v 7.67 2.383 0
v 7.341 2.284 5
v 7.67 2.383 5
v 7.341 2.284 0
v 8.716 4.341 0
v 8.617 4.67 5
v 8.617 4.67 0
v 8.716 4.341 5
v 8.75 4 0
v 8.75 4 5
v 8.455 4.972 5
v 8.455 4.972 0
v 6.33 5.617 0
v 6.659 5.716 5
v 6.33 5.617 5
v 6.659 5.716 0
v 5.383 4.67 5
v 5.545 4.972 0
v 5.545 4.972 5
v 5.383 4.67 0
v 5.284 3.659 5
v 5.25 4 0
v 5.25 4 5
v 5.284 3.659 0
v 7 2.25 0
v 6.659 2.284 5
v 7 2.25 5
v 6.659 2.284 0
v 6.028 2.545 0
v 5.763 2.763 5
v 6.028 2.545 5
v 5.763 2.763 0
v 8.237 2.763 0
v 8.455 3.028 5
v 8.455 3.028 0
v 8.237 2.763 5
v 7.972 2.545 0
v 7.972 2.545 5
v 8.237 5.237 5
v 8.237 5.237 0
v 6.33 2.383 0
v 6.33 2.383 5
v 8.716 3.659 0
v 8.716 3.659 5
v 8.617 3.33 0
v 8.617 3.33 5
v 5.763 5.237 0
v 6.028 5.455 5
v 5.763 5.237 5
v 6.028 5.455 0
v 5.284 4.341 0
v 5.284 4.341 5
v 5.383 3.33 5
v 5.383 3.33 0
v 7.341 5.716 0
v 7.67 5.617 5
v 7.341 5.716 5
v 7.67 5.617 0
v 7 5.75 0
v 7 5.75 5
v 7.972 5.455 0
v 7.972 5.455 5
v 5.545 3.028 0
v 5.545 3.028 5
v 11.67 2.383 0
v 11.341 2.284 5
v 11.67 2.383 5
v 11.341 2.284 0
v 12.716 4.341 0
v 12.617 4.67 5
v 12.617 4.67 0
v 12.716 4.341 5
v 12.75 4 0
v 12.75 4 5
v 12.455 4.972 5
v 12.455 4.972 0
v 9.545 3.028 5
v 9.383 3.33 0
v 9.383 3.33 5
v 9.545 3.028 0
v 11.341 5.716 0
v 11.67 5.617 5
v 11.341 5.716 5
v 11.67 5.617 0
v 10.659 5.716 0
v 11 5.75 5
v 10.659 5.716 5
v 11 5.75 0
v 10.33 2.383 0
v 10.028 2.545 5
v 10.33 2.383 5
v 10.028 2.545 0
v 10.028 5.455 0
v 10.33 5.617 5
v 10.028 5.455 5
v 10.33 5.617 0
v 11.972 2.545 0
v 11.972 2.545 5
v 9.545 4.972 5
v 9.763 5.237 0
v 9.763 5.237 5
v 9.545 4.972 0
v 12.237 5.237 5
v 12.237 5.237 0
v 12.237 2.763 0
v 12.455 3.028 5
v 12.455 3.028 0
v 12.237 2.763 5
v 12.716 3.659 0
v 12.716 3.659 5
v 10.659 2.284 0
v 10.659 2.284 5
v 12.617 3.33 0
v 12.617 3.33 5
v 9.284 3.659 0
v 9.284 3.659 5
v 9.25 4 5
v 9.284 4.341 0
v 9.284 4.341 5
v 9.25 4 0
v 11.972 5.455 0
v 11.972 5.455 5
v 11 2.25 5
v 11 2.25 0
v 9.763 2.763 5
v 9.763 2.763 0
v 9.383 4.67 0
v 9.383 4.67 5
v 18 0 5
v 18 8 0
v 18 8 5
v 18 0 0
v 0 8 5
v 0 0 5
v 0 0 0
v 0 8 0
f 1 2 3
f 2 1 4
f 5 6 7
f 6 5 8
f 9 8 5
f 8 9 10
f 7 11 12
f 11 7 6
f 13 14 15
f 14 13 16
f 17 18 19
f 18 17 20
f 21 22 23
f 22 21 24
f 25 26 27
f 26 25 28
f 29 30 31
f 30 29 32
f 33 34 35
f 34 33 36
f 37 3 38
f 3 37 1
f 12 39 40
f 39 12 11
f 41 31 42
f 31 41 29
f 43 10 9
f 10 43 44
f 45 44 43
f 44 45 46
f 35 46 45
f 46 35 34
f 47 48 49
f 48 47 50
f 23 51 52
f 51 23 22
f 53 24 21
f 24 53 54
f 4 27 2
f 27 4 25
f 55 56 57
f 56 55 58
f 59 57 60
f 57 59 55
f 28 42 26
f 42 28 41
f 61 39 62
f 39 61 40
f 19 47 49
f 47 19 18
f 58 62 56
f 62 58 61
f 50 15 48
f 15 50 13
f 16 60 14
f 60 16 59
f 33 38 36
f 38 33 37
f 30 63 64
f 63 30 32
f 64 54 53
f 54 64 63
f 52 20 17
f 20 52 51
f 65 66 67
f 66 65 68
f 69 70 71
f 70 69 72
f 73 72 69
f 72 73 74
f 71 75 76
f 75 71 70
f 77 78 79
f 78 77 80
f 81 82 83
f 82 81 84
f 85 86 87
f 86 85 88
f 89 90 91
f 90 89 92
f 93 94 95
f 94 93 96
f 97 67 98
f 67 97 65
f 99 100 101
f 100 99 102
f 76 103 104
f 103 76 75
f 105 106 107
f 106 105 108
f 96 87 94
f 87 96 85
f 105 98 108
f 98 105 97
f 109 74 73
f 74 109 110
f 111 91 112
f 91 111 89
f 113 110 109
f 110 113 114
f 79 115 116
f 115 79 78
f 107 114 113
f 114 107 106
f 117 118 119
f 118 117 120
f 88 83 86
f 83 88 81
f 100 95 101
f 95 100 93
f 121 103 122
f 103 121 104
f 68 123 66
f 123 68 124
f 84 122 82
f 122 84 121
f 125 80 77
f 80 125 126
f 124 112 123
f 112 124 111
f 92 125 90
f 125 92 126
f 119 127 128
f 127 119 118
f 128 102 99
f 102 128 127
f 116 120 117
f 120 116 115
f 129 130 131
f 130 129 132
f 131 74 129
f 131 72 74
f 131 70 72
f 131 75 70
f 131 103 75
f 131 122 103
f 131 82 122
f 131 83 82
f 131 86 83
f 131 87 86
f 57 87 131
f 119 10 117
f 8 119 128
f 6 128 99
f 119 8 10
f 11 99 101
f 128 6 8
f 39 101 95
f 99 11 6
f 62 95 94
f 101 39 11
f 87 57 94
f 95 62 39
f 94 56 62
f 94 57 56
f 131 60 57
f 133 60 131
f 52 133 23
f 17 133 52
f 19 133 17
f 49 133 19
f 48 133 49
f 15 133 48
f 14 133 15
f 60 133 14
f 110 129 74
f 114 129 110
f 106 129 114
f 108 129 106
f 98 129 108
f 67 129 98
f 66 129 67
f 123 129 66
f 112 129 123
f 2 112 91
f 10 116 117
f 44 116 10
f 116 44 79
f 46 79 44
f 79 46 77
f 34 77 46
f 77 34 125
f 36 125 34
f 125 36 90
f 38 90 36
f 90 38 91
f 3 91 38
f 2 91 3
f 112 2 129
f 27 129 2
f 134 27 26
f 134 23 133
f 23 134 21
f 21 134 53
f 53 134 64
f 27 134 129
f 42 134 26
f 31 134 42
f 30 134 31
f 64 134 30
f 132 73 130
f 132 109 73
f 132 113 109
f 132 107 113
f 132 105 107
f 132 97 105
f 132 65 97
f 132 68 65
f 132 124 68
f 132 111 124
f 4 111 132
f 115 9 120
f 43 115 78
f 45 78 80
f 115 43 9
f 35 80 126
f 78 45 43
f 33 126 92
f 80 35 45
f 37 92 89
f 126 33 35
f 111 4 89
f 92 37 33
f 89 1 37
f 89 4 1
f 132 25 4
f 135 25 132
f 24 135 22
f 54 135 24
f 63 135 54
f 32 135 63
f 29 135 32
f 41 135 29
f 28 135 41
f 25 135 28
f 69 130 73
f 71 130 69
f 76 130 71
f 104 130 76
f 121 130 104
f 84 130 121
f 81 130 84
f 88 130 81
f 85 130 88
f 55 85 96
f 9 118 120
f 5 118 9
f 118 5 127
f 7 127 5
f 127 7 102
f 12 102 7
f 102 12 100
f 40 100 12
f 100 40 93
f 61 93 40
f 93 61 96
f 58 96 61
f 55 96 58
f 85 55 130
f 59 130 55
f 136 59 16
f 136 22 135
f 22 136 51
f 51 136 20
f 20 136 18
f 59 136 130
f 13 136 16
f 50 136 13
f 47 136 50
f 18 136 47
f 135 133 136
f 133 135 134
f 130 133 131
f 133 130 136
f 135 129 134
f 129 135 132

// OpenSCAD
$fn = 32;

// ----------------------------------------------------------------------
// Micro pad: two-hole pad, 5-20 mm class
// ----------------------------------------------------------------------

// --- parameters (mm) ---
pad_l = 18;               // pad length, X
pad_w = 8;                // pad width, Y
pad_t = 5;                // pad thickness, Z
hole_d = 3.5;             // hole diameter
hole_x = 7;               // X of the first hole centre

difference() {
  cube([pad_l, pad_w, pad_t]);
  for (x = [hole_x, pad_l - hole_x])
    translate([x, pad_w / 2, -1])
      cylinder(h = pad_t + 2, d = hole_d);
}
